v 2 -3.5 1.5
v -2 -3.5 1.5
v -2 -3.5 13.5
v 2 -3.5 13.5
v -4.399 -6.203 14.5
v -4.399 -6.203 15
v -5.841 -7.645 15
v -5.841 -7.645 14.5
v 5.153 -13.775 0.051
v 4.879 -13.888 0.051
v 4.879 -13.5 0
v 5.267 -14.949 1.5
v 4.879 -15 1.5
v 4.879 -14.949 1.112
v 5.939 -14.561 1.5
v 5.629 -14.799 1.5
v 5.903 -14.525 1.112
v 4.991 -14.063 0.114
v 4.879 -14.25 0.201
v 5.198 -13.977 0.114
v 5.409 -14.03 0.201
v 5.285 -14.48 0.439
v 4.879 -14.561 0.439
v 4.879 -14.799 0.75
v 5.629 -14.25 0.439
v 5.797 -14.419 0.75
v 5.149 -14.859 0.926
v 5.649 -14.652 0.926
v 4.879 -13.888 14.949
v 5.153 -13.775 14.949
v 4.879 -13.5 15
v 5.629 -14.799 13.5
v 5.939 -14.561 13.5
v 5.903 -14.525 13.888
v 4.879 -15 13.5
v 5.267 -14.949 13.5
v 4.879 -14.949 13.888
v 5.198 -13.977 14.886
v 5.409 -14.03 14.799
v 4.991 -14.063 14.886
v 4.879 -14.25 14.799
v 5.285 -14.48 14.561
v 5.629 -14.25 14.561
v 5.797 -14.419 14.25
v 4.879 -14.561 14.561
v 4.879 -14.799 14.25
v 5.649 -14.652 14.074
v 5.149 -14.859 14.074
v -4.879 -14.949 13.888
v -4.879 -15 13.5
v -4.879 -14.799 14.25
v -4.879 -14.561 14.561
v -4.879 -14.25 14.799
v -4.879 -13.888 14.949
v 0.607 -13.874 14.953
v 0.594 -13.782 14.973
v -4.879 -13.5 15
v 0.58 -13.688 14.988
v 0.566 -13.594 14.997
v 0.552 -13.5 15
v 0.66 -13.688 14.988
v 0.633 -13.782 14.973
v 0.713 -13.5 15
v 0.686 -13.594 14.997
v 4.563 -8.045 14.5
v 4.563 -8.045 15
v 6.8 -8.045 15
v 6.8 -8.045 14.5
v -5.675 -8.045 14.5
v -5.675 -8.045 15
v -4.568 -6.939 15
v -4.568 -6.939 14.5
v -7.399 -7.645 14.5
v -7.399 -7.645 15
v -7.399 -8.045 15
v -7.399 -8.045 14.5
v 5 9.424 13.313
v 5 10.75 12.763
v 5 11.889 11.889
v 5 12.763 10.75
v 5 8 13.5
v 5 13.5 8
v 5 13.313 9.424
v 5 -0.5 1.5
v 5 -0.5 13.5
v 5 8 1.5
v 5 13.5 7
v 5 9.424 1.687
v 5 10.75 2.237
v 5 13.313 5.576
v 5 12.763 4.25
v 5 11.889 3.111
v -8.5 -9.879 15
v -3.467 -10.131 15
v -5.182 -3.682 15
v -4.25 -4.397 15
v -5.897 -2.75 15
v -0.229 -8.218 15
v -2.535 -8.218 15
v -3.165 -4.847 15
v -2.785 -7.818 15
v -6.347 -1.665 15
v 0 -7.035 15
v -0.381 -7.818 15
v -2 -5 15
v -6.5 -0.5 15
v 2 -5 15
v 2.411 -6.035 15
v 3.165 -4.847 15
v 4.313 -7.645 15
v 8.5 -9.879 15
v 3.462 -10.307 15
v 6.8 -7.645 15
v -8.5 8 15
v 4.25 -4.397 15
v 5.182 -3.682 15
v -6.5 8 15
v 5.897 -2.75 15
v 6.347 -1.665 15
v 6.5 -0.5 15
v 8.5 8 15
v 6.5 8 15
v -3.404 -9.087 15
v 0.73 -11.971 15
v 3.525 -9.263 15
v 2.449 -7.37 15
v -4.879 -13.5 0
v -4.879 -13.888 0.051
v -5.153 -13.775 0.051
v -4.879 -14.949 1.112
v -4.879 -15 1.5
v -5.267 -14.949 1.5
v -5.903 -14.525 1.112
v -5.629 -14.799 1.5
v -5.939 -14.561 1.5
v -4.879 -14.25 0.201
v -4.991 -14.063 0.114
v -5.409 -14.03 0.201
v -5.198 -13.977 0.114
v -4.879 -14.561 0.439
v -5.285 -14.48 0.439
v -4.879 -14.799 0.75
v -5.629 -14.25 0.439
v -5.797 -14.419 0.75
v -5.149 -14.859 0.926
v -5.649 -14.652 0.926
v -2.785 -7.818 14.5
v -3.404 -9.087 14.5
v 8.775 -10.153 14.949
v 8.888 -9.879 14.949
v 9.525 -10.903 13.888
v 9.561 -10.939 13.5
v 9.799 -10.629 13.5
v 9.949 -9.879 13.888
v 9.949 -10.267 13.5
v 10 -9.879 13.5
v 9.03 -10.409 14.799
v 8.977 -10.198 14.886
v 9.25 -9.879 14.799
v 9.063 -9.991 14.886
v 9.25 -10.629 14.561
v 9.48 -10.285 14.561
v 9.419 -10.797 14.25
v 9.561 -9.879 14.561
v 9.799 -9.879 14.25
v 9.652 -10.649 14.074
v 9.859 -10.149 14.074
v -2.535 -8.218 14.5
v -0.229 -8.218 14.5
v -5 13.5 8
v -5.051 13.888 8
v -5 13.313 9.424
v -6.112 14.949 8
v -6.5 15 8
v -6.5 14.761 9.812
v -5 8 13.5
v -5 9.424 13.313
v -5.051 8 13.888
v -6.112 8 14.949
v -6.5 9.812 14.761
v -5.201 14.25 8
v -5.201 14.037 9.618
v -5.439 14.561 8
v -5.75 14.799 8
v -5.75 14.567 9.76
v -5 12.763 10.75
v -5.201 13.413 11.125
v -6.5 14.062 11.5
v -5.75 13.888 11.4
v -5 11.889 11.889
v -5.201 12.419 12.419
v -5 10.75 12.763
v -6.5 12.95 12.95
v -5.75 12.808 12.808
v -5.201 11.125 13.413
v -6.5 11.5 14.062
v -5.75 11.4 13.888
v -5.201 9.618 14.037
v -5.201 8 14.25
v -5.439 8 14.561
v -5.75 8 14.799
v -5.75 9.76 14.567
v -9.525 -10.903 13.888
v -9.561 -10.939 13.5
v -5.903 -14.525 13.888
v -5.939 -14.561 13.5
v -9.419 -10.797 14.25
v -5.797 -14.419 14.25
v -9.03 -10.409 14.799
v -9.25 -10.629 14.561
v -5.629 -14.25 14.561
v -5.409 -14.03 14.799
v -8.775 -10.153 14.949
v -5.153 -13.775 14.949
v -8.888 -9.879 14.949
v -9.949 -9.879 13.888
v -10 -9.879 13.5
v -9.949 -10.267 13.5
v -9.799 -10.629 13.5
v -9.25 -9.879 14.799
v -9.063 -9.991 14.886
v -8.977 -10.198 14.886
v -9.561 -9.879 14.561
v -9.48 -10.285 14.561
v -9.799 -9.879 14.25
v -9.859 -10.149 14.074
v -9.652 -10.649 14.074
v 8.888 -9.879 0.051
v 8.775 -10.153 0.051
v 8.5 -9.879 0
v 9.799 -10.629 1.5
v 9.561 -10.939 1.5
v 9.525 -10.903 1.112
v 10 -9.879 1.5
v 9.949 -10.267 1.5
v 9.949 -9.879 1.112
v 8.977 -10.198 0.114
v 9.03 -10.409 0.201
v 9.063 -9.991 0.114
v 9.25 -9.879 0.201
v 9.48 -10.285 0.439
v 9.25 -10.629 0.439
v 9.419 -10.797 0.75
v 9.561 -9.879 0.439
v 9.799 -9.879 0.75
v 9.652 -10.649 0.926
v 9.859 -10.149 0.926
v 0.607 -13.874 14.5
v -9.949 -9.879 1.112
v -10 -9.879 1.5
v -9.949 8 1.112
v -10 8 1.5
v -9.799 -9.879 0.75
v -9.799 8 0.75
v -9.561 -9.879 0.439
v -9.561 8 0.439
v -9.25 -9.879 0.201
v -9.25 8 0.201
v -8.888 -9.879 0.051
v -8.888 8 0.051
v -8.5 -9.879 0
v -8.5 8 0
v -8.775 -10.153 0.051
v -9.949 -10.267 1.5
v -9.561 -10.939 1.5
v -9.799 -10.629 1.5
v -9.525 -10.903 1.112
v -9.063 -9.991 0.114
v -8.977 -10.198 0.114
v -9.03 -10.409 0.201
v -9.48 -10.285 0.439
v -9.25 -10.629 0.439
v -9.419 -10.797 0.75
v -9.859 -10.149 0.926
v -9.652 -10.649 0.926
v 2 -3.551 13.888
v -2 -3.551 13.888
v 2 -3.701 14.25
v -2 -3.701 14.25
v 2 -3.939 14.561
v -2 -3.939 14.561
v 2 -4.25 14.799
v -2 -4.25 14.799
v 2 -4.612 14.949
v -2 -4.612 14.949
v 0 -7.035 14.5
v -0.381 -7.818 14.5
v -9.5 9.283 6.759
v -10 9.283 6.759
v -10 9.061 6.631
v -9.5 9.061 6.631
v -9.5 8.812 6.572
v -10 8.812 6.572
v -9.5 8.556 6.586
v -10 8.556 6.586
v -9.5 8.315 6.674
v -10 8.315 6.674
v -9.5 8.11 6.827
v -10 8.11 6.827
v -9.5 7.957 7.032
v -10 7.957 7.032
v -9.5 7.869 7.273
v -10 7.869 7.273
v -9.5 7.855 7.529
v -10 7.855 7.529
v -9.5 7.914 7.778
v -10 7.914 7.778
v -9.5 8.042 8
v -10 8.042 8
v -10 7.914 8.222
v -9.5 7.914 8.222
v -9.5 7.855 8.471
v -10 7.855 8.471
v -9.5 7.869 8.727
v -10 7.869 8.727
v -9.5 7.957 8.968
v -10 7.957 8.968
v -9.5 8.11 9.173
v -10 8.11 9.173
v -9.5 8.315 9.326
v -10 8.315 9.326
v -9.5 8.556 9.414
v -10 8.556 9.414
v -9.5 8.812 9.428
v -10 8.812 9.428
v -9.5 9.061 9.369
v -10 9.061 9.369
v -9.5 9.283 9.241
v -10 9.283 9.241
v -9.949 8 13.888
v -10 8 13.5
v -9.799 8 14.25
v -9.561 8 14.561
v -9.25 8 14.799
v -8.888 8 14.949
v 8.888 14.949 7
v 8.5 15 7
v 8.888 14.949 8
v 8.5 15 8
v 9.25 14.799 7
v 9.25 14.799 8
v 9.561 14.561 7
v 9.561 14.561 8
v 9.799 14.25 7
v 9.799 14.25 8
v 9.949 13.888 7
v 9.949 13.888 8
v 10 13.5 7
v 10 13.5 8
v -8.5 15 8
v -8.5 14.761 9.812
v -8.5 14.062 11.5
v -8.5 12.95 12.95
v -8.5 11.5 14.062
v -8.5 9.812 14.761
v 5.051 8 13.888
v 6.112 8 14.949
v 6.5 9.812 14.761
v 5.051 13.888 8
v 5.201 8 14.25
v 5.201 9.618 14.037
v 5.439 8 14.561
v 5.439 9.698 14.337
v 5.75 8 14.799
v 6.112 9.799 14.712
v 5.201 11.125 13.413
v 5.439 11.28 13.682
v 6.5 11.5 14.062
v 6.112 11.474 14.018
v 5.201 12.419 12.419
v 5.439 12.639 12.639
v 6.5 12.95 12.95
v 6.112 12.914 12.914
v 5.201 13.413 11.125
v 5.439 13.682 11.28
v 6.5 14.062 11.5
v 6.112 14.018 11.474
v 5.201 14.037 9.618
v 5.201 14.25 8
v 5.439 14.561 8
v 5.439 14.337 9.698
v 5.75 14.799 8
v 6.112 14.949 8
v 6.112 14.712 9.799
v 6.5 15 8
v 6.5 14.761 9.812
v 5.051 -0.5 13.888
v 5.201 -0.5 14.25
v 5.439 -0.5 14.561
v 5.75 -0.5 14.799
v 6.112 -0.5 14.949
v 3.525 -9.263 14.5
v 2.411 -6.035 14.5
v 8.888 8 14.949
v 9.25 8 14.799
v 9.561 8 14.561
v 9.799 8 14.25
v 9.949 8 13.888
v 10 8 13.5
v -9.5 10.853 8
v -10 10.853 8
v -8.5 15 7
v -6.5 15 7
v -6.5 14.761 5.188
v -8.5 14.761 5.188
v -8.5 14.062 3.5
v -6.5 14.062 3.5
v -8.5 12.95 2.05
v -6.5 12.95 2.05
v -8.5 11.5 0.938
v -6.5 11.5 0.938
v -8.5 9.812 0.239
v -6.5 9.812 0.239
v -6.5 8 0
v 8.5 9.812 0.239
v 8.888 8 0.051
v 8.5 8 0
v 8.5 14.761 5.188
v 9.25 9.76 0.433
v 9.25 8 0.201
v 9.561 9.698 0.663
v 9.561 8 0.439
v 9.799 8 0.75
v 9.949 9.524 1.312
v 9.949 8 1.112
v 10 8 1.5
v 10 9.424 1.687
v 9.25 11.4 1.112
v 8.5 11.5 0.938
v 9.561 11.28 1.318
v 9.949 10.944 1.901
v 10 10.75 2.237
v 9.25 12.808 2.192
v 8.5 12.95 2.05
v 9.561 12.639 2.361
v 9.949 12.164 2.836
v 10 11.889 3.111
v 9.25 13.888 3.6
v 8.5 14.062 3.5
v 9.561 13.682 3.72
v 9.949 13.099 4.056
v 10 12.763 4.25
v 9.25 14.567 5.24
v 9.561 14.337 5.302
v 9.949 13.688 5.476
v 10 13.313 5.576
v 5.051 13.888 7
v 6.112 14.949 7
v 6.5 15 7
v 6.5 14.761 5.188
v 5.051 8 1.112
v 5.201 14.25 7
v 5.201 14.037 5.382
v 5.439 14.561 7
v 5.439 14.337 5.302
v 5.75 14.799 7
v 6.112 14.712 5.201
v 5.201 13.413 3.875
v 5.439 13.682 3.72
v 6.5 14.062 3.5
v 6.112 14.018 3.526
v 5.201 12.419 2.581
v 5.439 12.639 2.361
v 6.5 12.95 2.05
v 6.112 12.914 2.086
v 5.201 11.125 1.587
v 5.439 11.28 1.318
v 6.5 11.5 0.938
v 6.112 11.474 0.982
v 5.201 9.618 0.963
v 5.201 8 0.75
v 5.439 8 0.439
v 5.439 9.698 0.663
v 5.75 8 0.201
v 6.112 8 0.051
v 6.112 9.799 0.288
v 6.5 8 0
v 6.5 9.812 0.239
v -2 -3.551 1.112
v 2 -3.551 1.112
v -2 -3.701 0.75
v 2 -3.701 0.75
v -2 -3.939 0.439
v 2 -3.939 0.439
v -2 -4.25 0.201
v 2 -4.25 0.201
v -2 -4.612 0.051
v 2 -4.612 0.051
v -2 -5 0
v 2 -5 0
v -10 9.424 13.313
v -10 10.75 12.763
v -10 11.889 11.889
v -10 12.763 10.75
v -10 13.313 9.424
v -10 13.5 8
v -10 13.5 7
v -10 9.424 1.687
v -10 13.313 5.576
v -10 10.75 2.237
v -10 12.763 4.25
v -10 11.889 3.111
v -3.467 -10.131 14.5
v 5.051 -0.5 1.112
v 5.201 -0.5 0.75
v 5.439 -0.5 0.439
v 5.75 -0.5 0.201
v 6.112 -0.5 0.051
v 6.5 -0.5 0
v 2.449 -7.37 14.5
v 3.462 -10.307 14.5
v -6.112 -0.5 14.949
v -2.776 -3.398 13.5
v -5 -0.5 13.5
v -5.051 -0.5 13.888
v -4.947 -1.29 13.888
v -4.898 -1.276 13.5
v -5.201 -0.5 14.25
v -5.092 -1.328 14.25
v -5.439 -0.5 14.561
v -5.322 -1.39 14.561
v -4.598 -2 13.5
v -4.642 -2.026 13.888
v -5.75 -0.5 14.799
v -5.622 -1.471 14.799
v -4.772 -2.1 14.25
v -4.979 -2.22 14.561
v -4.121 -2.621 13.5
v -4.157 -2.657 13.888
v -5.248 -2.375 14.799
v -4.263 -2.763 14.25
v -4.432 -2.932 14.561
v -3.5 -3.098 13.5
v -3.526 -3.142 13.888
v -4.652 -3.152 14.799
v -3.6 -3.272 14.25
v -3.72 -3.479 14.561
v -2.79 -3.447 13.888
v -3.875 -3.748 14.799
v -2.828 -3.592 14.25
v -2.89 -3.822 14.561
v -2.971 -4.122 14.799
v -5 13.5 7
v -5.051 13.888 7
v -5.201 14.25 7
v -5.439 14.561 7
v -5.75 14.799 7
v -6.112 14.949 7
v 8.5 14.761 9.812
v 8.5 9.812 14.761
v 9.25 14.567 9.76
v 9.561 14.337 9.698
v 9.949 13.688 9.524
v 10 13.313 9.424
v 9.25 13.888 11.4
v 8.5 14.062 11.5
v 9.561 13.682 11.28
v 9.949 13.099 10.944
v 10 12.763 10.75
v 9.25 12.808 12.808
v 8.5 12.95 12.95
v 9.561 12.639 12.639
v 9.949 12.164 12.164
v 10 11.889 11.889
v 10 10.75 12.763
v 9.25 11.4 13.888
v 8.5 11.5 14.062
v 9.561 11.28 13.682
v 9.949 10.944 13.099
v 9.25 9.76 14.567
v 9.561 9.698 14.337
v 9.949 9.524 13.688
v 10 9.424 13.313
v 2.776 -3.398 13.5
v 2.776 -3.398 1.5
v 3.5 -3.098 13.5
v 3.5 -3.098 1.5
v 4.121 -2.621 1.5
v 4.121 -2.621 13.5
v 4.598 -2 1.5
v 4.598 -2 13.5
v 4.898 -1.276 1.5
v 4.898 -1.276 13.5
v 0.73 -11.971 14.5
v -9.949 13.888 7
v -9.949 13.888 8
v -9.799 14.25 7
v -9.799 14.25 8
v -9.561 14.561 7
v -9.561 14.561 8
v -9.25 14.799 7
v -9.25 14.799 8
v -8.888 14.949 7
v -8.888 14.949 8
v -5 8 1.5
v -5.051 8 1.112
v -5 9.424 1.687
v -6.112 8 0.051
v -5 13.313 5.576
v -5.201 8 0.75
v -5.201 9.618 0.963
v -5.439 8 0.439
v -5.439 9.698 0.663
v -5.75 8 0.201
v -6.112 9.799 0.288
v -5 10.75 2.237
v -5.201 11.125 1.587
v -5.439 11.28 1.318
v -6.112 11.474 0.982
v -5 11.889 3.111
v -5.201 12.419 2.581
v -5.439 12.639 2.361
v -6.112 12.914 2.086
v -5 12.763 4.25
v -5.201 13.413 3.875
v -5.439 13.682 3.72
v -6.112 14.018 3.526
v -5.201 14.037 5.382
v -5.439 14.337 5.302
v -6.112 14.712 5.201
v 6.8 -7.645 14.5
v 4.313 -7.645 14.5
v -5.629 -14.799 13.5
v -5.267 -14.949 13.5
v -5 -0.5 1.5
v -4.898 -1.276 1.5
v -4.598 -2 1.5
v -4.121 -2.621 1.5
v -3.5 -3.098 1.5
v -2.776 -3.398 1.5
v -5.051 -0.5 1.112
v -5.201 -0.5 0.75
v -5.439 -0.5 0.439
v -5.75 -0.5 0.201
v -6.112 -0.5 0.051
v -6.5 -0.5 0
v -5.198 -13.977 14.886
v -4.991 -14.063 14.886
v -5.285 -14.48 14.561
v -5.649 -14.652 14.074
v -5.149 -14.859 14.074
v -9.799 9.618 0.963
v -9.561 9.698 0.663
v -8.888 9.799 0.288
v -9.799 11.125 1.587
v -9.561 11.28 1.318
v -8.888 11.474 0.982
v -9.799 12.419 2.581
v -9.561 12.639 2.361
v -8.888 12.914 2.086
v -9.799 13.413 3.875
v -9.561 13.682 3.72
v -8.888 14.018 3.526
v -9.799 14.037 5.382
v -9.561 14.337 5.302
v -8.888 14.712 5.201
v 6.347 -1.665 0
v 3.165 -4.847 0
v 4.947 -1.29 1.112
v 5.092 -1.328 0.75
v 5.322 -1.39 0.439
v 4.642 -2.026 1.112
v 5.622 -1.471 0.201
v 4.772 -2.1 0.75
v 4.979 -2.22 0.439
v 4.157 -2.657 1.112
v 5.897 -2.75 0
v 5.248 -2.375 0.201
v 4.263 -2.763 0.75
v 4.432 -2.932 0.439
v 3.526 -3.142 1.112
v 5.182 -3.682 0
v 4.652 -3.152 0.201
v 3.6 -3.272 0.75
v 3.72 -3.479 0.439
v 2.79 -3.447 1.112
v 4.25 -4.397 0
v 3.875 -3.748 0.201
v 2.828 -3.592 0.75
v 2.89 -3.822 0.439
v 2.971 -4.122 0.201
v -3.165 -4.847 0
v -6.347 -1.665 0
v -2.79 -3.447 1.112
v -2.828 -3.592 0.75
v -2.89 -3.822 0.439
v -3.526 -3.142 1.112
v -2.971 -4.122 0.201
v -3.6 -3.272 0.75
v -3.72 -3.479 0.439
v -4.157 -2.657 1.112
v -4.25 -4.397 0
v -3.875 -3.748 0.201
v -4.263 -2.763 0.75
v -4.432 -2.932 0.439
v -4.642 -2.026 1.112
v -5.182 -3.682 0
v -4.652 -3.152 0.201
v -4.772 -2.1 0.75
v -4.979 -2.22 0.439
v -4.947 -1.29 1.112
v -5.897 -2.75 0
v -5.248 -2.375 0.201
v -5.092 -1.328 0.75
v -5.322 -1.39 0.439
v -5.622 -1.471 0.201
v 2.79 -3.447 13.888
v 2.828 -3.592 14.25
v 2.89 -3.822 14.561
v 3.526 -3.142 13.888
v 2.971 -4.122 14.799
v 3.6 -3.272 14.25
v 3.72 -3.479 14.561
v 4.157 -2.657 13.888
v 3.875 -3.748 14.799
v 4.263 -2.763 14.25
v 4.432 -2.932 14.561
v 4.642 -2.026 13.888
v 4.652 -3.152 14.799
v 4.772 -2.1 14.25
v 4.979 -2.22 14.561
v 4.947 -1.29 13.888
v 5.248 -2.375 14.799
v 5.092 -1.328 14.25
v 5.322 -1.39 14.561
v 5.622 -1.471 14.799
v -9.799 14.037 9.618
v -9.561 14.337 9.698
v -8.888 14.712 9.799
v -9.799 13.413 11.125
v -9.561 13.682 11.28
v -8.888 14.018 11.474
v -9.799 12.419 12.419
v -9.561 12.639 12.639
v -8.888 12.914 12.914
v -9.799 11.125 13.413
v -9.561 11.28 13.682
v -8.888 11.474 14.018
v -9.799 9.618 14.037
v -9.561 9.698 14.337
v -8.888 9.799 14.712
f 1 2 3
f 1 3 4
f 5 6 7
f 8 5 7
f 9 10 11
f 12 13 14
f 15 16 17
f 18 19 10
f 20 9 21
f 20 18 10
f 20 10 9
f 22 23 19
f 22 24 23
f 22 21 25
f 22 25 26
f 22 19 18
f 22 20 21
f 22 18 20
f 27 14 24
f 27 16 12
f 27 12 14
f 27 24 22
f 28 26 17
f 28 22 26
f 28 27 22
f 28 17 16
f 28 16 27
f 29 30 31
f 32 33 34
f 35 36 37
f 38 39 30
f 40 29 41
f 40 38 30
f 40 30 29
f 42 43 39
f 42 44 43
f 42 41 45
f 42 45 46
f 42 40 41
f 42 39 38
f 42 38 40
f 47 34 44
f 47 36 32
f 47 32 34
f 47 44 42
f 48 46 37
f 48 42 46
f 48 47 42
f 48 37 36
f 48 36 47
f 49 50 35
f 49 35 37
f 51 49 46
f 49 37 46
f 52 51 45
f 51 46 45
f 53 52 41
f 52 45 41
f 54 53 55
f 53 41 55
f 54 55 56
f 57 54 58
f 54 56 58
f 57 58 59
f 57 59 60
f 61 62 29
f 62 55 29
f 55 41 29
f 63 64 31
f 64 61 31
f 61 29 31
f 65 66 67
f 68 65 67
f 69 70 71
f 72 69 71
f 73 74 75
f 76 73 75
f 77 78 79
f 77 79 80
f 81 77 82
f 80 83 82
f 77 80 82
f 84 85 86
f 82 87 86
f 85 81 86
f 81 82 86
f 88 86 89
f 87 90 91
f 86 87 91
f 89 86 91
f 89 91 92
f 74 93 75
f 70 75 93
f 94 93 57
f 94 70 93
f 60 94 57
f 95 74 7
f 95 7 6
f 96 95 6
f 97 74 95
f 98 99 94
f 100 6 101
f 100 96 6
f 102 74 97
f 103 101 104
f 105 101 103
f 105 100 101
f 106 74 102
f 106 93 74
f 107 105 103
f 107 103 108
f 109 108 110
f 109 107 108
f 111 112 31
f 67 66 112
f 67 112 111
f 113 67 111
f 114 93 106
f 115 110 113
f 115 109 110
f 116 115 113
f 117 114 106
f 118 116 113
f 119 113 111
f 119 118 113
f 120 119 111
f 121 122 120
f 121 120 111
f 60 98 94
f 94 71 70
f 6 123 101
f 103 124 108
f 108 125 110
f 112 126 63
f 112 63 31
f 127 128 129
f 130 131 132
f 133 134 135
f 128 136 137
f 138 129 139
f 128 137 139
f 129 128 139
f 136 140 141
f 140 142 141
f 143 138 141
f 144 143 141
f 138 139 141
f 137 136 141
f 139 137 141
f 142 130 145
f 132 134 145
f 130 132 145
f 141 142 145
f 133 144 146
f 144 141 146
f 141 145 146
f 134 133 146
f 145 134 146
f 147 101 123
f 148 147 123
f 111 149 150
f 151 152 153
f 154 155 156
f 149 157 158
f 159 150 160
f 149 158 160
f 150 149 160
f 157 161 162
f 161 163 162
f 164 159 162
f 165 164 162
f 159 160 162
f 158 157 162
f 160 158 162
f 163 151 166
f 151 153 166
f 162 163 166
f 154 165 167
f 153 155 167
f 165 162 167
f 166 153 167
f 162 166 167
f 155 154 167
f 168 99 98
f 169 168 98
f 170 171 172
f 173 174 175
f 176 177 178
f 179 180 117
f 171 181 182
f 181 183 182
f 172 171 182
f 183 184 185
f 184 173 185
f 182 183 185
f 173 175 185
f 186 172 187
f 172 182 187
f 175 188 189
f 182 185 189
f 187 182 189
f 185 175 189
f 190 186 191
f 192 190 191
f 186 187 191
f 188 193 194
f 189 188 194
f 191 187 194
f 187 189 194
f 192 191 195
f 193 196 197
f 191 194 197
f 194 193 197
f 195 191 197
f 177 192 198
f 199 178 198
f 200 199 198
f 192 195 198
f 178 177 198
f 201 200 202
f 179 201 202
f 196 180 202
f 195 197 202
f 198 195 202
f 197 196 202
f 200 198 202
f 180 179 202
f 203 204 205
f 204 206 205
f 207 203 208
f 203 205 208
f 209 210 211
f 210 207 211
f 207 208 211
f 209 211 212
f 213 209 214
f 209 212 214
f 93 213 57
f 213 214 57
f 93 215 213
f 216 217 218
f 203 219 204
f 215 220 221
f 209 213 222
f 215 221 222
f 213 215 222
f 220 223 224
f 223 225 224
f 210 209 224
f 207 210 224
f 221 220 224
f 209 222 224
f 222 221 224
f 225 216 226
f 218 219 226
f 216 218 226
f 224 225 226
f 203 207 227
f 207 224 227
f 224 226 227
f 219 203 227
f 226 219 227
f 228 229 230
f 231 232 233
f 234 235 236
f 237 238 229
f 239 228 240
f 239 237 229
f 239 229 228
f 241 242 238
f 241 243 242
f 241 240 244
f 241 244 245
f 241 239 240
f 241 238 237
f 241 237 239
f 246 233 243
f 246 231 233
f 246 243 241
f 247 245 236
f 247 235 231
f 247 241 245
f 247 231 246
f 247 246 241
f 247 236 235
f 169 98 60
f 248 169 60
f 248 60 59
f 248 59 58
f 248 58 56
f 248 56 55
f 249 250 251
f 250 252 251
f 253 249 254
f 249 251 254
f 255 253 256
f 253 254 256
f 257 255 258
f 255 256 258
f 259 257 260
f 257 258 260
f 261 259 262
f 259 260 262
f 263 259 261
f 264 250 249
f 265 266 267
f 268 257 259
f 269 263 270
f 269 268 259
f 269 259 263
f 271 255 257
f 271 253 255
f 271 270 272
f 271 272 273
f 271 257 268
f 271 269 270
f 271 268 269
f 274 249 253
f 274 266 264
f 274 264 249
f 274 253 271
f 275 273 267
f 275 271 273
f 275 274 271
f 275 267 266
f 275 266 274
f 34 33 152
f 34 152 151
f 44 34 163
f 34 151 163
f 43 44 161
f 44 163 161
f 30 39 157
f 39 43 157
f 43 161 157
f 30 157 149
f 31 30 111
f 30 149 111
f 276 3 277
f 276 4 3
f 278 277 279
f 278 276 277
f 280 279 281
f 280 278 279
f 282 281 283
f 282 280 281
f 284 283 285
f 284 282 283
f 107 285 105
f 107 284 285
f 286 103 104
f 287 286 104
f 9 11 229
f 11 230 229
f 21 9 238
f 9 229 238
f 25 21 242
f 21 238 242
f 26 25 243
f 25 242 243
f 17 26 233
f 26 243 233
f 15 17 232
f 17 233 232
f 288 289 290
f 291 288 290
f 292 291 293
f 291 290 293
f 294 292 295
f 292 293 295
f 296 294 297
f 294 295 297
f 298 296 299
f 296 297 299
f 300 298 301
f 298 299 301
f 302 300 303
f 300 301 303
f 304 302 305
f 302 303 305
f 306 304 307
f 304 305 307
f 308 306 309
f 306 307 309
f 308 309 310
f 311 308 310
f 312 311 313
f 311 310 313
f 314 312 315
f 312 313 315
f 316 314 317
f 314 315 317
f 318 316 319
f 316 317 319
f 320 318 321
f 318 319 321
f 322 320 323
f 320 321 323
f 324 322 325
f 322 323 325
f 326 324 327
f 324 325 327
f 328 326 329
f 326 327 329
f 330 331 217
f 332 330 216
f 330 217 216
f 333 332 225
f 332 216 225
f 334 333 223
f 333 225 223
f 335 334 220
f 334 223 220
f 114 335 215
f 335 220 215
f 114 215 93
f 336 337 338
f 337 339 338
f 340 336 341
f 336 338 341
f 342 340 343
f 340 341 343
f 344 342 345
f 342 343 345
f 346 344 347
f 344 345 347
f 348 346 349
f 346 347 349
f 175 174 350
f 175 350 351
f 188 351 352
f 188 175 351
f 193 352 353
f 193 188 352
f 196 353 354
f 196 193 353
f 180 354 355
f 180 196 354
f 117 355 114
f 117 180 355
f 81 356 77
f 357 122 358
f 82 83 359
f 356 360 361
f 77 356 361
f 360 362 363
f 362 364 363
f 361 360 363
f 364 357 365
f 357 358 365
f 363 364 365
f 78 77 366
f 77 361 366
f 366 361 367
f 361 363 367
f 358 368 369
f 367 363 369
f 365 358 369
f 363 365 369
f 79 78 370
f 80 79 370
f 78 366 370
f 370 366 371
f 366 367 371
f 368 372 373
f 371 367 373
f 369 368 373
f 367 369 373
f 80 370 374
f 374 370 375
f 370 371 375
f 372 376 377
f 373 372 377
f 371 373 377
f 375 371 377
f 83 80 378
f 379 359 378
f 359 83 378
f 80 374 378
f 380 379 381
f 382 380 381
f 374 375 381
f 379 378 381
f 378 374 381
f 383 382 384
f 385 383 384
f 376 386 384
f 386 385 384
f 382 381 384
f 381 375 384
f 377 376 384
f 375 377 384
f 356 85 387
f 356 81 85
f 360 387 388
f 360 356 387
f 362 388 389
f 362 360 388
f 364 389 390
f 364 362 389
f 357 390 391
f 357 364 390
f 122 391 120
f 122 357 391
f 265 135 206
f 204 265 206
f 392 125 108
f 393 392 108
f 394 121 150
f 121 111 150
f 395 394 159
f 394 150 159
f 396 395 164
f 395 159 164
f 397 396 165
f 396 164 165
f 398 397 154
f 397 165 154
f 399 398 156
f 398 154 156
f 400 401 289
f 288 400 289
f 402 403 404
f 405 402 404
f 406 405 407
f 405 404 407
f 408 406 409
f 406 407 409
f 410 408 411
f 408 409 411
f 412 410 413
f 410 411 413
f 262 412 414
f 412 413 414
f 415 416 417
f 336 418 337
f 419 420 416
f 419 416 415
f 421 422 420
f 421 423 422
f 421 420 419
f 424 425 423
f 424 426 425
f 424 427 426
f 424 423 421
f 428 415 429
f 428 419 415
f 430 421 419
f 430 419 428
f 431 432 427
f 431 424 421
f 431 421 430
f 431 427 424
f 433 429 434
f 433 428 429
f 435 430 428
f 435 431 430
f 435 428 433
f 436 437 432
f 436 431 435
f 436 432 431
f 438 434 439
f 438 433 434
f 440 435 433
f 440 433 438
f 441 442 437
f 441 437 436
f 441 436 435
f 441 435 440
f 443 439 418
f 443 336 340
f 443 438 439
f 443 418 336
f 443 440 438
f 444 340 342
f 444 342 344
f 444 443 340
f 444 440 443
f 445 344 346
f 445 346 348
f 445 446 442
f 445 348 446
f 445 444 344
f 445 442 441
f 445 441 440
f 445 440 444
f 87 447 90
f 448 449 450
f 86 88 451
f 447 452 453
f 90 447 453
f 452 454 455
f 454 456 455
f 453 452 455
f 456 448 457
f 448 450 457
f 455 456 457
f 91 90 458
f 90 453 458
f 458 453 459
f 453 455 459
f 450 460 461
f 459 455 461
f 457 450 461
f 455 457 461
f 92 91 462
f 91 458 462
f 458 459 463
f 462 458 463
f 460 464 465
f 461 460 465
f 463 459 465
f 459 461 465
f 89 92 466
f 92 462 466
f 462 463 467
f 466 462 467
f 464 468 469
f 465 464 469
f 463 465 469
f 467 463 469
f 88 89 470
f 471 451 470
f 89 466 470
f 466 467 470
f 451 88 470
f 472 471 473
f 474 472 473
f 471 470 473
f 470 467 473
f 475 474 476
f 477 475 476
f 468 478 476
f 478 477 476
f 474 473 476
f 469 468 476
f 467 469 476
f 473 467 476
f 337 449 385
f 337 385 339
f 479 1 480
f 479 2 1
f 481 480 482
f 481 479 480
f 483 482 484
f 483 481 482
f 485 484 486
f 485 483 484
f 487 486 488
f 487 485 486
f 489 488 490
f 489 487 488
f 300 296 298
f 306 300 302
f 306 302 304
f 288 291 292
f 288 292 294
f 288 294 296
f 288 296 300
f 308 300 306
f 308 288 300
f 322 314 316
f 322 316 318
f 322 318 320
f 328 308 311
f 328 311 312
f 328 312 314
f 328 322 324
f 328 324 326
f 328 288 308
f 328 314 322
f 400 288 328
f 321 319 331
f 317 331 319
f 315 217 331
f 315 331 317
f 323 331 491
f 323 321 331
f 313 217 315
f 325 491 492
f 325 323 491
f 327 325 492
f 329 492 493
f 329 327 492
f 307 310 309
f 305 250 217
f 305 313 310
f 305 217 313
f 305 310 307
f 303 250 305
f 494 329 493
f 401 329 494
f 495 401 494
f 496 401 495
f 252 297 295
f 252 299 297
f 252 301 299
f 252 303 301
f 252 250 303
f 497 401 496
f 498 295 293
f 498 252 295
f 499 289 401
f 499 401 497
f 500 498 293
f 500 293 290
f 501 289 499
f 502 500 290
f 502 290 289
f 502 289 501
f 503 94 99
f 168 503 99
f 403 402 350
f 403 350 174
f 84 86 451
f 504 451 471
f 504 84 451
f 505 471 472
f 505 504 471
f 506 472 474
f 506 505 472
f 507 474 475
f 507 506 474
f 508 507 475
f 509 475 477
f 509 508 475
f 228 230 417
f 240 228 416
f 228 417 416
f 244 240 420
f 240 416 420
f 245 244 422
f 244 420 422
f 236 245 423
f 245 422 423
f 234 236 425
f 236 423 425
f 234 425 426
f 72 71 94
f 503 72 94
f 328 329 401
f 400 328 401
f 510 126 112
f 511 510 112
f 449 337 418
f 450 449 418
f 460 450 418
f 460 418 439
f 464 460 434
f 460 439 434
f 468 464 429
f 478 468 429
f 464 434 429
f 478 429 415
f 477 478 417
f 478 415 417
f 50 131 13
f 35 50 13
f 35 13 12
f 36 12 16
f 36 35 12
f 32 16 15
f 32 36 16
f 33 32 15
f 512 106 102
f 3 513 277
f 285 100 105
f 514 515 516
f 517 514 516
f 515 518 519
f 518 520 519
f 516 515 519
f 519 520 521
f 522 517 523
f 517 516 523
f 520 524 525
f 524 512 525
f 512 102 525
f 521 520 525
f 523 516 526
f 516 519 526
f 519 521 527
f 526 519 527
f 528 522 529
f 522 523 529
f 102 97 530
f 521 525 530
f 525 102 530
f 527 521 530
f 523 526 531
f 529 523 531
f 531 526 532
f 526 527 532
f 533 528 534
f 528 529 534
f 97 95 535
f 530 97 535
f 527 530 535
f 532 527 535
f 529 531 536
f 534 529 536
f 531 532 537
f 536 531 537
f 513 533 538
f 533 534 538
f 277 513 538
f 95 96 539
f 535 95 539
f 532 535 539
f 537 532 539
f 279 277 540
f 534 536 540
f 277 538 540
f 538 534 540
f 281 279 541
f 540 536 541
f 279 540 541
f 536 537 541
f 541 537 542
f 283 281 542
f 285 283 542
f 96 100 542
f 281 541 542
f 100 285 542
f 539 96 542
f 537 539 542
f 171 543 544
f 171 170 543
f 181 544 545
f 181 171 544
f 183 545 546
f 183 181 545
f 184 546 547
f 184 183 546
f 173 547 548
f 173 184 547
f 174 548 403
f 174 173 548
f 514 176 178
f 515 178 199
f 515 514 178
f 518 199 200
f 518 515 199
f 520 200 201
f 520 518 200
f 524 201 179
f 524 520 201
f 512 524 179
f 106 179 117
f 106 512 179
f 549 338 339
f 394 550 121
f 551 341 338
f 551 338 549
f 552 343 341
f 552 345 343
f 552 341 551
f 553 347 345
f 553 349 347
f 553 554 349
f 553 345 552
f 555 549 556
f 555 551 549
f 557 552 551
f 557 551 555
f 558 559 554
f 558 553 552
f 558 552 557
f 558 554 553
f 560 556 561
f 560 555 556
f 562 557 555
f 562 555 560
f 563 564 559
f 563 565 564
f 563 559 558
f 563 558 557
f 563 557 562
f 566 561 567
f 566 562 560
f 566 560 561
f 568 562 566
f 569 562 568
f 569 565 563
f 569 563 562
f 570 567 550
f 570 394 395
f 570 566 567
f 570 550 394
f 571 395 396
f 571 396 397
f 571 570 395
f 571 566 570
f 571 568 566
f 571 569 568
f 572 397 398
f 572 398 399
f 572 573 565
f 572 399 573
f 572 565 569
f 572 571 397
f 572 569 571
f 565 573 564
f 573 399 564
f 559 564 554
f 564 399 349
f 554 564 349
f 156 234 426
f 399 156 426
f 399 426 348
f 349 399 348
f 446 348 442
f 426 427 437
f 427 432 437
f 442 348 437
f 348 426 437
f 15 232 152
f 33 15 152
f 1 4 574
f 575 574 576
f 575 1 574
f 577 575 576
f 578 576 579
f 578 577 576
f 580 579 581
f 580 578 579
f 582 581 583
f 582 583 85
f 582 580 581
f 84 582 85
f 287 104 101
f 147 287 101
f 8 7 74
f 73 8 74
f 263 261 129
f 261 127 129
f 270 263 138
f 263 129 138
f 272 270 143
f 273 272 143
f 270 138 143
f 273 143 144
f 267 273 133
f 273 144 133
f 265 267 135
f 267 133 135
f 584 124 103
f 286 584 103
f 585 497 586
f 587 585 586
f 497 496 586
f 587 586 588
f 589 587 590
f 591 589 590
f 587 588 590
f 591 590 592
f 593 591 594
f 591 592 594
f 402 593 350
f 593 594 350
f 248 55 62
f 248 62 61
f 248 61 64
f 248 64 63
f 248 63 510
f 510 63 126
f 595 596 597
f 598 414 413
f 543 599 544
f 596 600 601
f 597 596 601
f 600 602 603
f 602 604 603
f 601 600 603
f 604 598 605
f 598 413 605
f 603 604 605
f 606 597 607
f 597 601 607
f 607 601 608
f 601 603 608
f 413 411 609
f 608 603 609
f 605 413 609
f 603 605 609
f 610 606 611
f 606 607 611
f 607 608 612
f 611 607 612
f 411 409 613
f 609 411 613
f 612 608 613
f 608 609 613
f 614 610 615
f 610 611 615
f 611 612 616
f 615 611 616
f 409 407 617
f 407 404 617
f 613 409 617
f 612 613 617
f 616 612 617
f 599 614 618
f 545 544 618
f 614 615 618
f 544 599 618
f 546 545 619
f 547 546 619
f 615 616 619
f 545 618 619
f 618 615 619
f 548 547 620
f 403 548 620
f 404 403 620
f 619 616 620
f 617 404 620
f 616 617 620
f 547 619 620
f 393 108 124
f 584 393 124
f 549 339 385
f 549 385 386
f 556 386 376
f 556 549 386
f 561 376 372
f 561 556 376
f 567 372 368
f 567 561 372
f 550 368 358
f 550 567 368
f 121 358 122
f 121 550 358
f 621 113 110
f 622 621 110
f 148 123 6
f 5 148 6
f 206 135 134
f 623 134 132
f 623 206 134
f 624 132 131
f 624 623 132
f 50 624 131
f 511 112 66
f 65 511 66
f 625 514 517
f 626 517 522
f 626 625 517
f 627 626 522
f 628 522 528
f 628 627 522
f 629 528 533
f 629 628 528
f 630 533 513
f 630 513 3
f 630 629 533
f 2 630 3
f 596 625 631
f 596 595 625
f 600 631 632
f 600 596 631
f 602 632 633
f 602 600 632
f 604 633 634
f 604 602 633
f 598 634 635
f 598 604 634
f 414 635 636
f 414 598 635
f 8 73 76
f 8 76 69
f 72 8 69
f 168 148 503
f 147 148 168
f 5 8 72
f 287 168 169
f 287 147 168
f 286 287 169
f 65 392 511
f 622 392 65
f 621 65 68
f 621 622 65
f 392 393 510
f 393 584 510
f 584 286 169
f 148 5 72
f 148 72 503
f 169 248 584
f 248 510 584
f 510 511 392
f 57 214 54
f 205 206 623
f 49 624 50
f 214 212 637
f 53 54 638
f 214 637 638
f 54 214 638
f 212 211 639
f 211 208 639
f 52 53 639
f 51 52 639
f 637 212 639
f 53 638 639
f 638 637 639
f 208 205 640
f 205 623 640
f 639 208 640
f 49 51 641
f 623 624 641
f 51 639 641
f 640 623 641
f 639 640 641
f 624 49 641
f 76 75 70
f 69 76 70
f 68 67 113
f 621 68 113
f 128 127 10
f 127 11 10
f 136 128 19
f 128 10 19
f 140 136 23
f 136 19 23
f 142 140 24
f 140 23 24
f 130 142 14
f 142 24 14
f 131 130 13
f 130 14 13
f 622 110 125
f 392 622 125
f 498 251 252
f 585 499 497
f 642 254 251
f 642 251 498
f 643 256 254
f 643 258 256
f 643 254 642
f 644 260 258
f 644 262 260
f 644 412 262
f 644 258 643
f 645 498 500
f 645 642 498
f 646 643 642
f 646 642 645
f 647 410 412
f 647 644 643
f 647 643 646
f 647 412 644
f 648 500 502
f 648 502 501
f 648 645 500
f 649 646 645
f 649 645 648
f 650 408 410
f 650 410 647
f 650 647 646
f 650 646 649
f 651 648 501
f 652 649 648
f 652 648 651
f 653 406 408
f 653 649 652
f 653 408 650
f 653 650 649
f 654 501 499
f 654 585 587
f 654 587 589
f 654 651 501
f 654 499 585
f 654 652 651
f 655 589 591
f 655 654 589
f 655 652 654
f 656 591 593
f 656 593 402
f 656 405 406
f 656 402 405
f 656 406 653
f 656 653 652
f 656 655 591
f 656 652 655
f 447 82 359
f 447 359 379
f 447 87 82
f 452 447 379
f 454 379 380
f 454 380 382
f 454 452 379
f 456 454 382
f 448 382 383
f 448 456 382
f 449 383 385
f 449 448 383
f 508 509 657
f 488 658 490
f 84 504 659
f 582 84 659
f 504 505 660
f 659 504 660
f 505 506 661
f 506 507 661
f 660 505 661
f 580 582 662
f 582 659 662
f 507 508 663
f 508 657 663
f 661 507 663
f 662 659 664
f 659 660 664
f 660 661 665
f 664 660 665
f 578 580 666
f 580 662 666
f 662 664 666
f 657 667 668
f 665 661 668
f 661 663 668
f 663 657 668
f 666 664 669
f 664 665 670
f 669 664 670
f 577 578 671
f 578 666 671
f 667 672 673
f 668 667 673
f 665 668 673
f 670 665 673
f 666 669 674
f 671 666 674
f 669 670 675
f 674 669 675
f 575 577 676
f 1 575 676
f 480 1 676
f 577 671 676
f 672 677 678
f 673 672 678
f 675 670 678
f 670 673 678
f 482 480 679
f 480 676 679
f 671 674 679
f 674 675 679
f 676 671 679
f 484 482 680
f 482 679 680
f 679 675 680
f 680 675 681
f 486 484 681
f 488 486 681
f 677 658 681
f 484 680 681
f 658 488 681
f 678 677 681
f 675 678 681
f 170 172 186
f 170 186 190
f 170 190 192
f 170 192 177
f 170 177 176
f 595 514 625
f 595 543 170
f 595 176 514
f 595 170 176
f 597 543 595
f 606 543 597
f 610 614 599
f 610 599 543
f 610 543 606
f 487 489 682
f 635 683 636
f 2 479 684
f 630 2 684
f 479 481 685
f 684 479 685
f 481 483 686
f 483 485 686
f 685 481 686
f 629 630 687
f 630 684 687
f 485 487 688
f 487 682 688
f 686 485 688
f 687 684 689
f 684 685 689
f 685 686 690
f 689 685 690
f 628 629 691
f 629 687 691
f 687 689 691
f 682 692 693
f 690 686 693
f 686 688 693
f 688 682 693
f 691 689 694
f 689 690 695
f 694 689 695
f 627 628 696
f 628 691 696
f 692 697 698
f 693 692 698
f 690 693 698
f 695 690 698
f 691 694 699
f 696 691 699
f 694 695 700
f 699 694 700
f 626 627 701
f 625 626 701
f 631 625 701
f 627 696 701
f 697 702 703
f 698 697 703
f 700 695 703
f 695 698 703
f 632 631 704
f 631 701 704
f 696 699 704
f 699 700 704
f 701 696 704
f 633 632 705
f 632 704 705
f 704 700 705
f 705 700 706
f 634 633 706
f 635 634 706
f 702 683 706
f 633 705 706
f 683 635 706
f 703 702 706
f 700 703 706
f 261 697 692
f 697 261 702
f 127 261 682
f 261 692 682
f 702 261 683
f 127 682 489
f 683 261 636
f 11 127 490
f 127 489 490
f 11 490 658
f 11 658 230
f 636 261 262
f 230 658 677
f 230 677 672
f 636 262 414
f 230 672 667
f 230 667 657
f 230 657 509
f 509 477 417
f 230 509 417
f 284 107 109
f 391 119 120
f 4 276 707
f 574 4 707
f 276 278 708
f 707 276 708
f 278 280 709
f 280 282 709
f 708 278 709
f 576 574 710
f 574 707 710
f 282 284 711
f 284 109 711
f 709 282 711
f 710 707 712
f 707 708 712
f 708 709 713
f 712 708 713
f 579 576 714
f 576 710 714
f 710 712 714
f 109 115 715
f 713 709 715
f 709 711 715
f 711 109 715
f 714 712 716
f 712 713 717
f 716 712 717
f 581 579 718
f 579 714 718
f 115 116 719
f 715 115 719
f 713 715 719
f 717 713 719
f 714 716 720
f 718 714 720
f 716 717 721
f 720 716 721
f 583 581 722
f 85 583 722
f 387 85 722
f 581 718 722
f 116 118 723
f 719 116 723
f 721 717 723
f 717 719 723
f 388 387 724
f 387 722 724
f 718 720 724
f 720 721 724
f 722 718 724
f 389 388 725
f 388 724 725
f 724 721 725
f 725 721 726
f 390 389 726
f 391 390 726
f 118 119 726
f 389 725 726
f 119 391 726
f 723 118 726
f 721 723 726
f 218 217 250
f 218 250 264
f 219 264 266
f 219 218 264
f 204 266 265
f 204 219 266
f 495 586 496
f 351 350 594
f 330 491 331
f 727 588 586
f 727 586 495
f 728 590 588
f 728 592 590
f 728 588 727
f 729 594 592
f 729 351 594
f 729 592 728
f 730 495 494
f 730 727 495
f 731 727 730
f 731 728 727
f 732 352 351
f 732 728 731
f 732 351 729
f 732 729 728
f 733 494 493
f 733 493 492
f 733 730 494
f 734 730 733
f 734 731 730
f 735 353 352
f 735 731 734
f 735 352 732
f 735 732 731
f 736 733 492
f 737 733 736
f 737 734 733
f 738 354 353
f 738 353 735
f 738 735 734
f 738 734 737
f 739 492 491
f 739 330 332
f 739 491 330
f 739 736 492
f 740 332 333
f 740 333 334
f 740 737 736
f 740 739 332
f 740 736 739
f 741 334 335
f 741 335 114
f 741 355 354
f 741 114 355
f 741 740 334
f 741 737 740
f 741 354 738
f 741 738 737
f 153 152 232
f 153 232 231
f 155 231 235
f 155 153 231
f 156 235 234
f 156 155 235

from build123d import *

# Parameters (mm, degrees)
ESQUISSE1_W             = 20
ESQUISSE1_H             = 30
BOSS_EXTRU_1_DEPTH      = 15
CONG_1_R                = 7
ESQUISSE2_W             = 10
ESQUISSE2_H             = 15
ENL_V_MAT_EXTRU_1_DEPTH = 18.5
CONG_2_R                = 3
CONG_3_R                = 1.5
CHANFREIN1_SIZE         = 4.5
CONG_4_R                = 1.5
ENL_V_MAT_EXTRU_2_DEPTH = 0.5
ENL_V_MAT_EXTRU_3_DEPTH = 0.5


with BuildPart() as part:
    # Esquisse1 → Boss.-Extru.1 (new body)
    with BuildSketch(Plane.XY):
        Rectangle(ESQUISSE1_W, ESQUISSE1_H)
    extrude(amount=BOSS_EXTRU_1_DEPTH)

    # Congé1
    cong_1_edges = [part.edges().sort_by_distance(p)[0] for p in [
        (0, 15, 0),
        (0, 15, 15),
    ]]
    fillet(cong_1_edges, radius=CONG_1_R)

    # Esquisse2 → Enlèv. mat.-Extru.1 (cut)
    with BuildSketch(Plane(origin=(0, 15, 0), x_dir=(1, 0, 0), z_dir=(0, 1, 0))):
        with Locations((0, -7.5)):
            Rectangle(ESQUISSE2_W, ESQUISSE2_H)
    extrude(amount=-ENL_V_MAT_EXTRU_1_DEPTH, mode=Mode.SUBTRACT)

    # Congé2
    cong_2_edges = [part.edges().sort_by_distance(p)[0] for p in [
        (5, -3.5, 7.5),
        (-5, -3.5, 7.5),
    ]]
    fillet(cong_2_edges, radius=CONG_2_R)

    # Congé3
    cong_3_edges = [part.edges().sort_by_distance(p)[0] for p in [
        (-5, 12.949747468, 12.949747468),
        (5, 12.949747468, 12.949747468),
        (5, 12.949747468, 2.050252532),
        (-5, 12.949747468, 2.050252532),
        (-5, 15, 7.5),
        (5, 15, 7.5),
        (0, -3.5, 0),
        (0, -3.5, 15),
        (-5, 3.75, 15),
        (-5, 3.75, 0),
        (5, 3.75, 0),
        (5, 3.75, 15),
        (-4.121320344, -2.621320344, 15),
        (-4.121320344, -2.621320344, 0),
        (4.121320344, -2.621320344, 0),
        (4.121320344, -2.621320344, 15),
    ]]
    fillet(cong_3_edges, radius=CONG_3_R)

    # Chanfrein1
    chanfrein1_edges = [part.edges().sort_by_distance(p)[0] for p in [
        (10, -15, 7.5),
        (-10, -15, 7.5),
    ]]
    chamfer(chanfrein1_edges, length=CHANFREIN1_SIZE)

    # Congé4
    cong_4_edges = [part.edges().sort_by_distance(p)[0] for p in [
        (10, -1.25, 0),
        (10, -1.25, 15),
        (10, -10.5, 7.5),
        (0, -15, 0),
        (-7.75, -12.75, 0),
        (7.75, -12.75, 0),
        (0, -15, 15),
        (-5.5, -15, 7.5),
        (5.5, -15, 7.5),
        (-7.75, -12.75, 15),
        (7.75, -12.75, 15),
        (-10, -10.5, 7.5),
        (-10, 15, 7.5),
        (10, 15, 7.5),
        (-10, -1.25, 0),
        (-10, -1.25, 15),
        (-10, 12.949747468, 12.949747468),
        (-10, 12.949747468, 2.050252532),
        (10, 12.949747468, 12.949747468),
        (10, 12.949747468, 2.050252532),
    ]]
    fillet(cong_4_edges, radius=CONG_4_R)

    # Esquisse3 → Enlèv. mat.-Extru.2 (cut)
    with BuildSketch(Plane.XY.offset(15)):
        Polygon((6.799705196, -7.645408133), (4.313330171, -7.645408133), (3.525434873, -9.2634614), (2.411418382, -6.034839284), (0.730170893, -11.971446212), (0, -7.035440736), (-0.380916703, -7.817706498), (-2.785361583, -7.817706498), (-3.403636623, -9.087420826), (-4.398752101, -6.20339544), (-5.840764794, -7.645408133), (-7.399157136, -7.645408133), (-7.399157136, -8.045408133), (-5.675079369, -8.045408133), (-4.568230072, -6.938558836), (-3.466779638, -10.130762237), (-2.535235756, -8.217706498), (-0.22946322, -8.217706498), (0.607203371, -13.873630222), (2.449002124, -7.370105128), (3.462291858, -10.306802811), (4.563455998, -8.045408133), (6.799705196, -8.045408133), align=None)
    extrude(amount=-ENL_V_MAT_EXTRU_2_DEPTH, mode=Mode.SUBTRACT)

    # Esquisse4 → Enlèv. mat.-Extru.3 (cut)
    with BuildSketch(Plane.ZY.offset(10)):
        with BuildLine():
            Line((9.241265037, 9.282942777), (8, 10.85264875))
            Line((8, 10.85264875), (6.758734963, 9.282942777))
            ThreePointArc((6.758734963, 9.282942777), (6.827029099, 8.109971877), (8, 8.04167774))
            ThreePointArc((8, 8.04167774), (9.172970901, 8.109971877), (9.241265037, 9.282942777))
        make_face()
    extrude(amount=-ENL_V_MAT_EXTRU_3_DEPTH, mode=Mode.SUBTRACT)


solid = part.part
